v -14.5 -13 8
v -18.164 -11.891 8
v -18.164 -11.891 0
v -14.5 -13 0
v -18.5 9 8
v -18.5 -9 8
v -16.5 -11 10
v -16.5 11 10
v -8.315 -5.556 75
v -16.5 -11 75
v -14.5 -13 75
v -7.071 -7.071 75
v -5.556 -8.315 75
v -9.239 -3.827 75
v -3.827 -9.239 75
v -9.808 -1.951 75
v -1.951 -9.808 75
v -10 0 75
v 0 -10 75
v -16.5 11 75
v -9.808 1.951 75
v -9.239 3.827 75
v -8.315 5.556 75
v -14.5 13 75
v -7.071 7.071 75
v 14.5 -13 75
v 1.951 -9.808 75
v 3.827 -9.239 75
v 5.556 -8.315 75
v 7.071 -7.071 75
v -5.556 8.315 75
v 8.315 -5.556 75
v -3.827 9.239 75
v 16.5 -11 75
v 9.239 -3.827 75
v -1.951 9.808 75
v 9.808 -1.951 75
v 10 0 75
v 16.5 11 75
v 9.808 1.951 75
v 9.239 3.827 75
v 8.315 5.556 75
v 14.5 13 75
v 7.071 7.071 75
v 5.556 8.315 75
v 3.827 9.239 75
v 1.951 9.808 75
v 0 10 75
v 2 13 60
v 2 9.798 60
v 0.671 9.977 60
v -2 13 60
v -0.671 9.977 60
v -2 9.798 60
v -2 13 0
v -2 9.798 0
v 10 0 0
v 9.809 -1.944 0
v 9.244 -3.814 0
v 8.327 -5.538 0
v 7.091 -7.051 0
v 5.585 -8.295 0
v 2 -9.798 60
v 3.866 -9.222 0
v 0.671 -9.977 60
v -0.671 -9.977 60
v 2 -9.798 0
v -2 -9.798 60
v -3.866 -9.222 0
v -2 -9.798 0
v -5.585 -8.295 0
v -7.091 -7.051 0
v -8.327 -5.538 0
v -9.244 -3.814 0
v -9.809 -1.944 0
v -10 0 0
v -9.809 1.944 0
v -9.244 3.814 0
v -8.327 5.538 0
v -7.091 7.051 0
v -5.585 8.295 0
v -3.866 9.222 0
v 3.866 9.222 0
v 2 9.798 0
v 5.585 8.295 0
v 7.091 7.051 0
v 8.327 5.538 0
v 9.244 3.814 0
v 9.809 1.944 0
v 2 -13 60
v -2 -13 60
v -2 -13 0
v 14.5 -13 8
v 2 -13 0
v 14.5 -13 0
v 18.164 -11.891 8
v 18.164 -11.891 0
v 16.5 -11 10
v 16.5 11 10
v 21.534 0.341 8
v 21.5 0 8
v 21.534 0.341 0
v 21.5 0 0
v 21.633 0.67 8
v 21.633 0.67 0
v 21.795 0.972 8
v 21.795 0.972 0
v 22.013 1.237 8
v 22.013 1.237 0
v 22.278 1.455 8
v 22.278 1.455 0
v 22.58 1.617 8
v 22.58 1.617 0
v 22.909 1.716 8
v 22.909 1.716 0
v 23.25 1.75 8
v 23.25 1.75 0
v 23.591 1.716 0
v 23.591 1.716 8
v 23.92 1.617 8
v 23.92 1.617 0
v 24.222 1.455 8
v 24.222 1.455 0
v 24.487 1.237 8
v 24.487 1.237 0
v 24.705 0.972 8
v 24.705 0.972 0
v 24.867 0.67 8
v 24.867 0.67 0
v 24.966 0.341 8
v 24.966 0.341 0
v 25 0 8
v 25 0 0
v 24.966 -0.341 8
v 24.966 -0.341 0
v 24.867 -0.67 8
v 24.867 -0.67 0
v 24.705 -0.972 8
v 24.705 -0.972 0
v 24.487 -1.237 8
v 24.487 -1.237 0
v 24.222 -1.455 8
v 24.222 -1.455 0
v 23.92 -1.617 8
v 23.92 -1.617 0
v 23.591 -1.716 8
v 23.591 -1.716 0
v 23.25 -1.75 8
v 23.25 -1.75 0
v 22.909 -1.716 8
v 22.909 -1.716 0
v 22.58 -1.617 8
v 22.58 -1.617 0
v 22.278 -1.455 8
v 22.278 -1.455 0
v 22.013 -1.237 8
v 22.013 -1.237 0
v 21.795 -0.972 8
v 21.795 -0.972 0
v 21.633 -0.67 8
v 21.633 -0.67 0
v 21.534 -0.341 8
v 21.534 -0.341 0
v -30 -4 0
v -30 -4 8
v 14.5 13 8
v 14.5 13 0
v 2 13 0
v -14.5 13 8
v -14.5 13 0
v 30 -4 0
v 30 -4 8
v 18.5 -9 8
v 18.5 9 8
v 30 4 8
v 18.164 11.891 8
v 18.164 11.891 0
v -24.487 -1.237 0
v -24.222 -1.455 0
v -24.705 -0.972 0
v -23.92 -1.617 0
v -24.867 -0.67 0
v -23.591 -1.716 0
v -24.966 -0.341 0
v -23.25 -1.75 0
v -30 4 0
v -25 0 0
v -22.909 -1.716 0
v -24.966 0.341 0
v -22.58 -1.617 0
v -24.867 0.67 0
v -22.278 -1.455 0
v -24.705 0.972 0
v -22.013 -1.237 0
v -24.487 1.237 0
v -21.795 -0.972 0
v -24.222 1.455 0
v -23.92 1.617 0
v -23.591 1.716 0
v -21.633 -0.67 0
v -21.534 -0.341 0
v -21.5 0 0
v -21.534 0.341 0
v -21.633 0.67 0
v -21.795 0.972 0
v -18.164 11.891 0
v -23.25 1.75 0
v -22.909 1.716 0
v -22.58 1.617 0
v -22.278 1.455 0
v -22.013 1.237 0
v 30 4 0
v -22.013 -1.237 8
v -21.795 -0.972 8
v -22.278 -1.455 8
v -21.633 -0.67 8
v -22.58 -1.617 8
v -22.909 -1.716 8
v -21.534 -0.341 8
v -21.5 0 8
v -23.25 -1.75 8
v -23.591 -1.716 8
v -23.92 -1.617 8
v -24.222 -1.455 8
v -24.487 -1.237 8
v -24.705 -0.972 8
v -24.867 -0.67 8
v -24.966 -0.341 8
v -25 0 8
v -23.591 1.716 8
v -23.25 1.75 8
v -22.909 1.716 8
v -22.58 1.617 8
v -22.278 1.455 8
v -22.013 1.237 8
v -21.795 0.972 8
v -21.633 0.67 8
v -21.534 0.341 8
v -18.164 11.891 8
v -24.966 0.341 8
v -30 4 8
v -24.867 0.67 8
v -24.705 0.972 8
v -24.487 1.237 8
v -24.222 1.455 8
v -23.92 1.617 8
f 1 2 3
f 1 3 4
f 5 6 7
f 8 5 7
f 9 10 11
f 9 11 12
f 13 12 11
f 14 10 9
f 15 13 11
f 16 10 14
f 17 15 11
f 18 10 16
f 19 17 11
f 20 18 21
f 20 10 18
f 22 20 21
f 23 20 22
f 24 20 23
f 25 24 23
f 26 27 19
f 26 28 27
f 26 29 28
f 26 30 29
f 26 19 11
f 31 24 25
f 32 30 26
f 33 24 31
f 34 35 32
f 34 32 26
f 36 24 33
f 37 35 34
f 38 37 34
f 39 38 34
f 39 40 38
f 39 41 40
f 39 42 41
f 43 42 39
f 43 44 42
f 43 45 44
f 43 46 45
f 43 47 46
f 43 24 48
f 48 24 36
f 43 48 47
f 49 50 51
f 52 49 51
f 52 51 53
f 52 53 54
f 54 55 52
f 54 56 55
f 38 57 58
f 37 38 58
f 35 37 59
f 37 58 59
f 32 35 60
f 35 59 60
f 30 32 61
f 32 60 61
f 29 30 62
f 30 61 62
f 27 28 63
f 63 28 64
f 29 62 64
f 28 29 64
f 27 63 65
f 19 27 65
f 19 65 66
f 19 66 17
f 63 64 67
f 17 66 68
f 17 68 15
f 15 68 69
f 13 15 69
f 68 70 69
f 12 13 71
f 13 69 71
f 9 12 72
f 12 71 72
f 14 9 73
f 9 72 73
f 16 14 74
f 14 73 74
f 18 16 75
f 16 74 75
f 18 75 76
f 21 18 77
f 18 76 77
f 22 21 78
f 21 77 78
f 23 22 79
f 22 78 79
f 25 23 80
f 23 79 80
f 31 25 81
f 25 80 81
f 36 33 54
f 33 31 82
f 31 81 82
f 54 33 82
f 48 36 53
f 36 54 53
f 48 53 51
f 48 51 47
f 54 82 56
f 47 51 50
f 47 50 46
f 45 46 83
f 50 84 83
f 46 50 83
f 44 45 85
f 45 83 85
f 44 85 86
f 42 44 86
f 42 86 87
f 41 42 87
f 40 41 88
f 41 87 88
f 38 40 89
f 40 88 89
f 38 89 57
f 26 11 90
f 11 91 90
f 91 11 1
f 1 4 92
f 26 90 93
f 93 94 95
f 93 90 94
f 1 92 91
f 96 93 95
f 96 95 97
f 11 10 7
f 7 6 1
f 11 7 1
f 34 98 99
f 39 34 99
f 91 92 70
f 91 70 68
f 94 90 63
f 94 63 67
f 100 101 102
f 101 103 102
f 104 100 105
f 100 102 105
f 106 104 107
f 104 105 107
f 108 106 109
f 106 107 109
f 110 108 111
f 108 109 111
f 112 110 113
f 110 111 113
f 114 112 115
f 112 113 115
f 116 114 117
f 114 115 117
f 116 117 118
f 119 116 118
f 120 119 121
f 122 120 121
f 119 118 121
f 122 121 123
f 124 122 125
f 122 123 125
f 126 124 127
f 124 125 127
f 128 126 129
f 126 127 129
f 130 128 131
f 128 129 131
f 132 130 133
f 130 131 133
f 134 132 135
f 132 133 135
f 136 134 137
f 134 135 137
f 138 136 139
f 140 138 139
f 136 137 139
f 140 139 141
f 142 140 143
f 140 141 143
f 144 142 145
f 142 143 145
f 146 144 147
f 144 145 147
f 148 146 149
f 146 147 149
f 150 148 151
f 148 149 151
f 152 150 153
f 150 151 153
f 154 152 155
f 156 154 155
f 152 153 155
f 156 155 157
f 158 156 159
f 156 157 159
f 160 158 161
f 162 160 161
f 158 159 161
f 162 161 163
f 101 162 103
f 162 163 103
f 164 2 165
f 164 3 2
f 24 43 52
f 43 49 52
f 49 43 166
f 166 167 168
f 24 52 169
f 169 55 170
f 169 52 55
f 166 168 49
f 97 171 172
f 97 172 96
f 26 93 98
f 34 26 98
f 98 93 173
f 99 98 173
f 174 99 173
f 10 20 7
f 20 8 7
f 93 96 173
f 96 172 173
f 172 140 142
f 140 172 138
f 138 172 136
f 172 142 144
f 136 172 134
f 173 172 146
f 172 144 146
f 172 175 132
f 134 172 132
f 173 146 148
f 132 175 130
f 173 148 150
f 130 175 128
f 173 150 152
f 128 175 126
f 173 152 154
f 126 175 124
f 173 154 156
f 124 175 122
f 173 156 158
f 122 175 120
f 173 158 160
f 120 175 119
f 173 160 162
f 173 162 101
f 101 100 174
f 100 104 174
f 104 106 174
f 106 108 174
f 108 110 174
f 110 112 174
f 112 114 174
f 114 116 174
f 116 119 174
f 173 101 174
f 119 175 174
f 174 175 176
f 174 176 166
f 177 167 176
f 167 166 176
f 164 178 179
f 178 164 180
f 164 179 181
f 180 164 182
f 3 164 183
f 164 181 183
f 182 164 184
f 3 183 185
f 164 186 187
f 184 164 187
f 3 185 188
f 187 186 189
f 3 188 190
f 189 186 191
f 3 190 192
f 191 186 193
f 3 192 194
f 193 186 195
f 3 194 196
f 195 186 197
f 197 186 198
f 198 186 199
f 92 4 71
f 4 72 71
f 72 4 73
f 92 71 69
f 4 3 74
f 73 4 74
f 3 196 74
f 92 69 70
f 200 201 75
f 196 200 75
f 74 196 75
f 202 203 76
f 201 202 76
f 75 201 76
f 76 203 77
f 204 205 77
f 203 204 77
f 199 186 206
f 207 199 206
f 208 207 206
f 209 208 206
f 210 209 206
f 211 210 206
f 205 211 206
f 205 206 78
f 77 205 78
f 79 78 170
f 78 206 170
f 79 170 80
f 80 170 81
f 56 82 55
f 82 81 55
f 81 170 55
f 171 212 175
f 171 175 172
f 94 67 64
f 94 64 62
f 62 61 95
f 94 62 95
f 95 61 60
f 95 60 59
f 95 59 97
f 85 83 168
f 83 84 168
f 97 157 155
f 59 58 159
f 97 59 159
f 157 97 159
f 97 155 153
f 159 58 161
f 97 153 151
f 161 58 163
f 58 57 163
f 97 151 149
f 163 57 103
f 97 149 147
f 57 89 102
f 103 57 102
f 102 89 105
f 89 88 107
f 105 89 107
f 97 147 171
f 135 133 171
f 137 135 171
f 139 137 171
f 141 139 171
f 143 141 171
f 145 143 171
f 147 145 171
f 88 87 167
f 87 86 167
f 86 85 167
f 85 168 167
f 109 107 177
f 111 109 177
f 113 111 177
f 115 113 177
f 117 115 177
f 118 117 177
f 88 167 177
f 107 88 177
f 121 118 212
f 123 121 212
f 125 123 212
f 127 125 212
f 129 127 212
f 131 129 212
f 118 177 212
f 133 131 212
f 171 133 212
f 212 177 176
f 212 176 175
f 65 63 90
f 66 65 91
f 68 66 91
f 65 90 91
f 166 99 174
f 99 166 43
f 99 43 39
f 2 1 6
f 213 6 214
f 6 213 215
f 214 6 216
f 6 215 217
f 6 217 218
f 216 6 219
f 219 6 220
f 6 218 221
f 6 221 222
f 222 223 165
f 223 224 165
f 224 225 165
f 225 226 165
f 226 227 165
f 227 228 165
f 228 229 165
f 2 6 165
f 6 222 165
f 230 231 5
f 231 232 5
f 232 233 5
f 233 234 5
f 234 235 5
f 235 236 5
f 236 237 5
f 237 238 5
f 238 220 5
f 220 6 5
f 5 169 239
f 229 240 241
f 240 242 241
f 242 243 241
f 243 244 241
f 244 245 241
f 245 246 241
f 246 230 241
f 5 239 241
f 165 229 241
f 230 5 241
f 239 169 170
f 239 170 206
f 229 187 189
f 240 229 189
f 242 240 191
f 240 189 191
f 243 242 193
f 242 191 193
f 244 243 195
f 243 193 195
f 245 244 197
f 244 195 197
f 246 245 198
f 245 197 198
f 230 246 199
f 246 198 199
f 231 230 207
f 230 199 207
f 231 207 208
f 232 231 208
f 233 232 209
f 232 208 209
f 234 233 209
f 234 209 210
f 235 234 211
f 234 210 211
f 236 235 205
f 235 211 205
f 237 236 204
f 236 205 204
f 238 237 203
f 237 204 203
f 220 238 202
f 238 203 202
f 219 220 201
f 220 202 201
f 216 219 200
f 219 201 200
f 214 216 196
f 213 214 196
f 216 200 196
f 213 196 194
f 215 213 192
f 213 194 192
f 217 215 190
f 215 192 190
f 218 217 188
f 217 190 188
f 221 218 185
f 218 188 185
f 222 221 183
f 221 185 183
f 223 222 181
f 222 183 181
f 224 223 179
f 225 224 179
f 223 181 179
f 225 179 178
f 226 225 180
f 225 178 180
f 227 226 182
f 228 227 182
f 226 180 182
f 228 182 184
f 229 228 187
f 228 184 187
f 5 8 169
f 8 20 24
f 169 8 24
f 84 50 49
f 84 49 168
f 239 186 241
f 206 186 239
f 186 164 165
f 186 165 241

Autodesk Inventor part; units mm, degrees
ref_plane "YZ Plane" through (0, 0, 0) normal (1, 0, 0) x (0, 1, 0)
ref_plane "XZ Plane" through (0, 0, 0) normal (0, 1, 0) x (-1, 0, 0)
ref_plane "XY Plane" through (0, 0, 0) normal (0, 0, 1) x (1, 0, 0)
sketch "スケッチ1" plane through (0, 0, 0) normal (0, 0, 1) x (1, 0, 0)
  line L0 (-16.5, 13) -> (16.5, 13)
  line L1 (16.5, 13) -> (16.5, -13)
  line L2 (16.5, -13) -> (-16.5, -13)
  line L3 (-16.5, -13) -> (-16.5, 13)
  line L4 (-16.5, 13) -> (16.5, -13) construction
  line L5 (16.5, 13) -> (-16.5, -13) construction
  circle A0 centre (0, 0) radius 10
  dimension "d0" = 33
  dimension "d1" = 26
  dimension "d2" = 20
extrude "押し出し1" add sketch "スケッチ1" along normal blind 70
sketch "スケッチ2" plane through (-16.5, -13, 0) normal (0, -1, 0) x (1, 0, 0)
  line L0 (18.5, 60) -> (18.5, 0)
  line L1 (18.5, 0) -> (14.5, 0)
  line L2 (14.5, 0) -> (14.5, 60)
  line L3 (18.5, 70) -> (14.5, 0) construction
  line L4 (18.5, 0) -> (14.5, 70) construction
  line L5 (0, 0) -> (33, 0) projected
  line L6 (18.5, 60) -> (14.5, 60)
  point P0 (16.5, 0)
  point P1 (16.5, 35)
  dimension "d5" = 4
extrude "押し出し2" cut sketch "スケッチ2" against normal blind 50
sketch "スケッチ3" plane through (0, 0, 70) normal (0, 0, 1) x (1, 0, 0)
  line L0 (-16.5, -13) -> (16.5, -13) projected
  line L1 (16.5, -13) -> (16.5, 13) projected
  line L2 (16.5, 13) -> (-16.5, 13) projected
  circle A0 centre (0, 0) radius 10 projected
  circle A1 centre (0, 0) radius 10 projected
  line L3 (16.5, 13) -> (-16.5, 13) projected
  line L4 (-16.5, 13) -> (-16.5, -13) projected
  line L5 (-16.5, -13) -> (16.5, -13) projected
  line L6 (16.5, -13) -> (-16.5, -13)
  line L7 (-16.5, -13) -> (-16.5, 13)
  line L8 (-16.5, 13) -> (16.5, 13)
  line L9 (16.5, 13) -> (16.5, -13)
  circle A2 centre (0, 0) radius 10
  line L10 (16.5, -13) -> (16.5, 13) projected
  line L11 (-16.5, 13) -> (-16.5, -13) projected
  dimension "d8" = 20
extrude "押し出し3" add sketch "スケッチ3" along normal blind 5
sketch "スケッチ4" plane through (0, 0, 0) normal (0, 0, -1) x (-1, 0, 0)
  line L0 (30, -4) -> (30, 4)
  line L1 (-30, 4) -> (-30, -4)
  line L2 (-30, -4) -> (30, 4) construction
  line L3 (30, -4) -> (-30, 4) construction
  line L4 (-2, 13) -> (-16.5, 13) projected
  line L5 (-16.5, 13) -> (-30, 4)
  line L6 (-16.5, 13) -> (-16.5, -13) projected
  line L7 (-30, -4) -> (-16.5, -13)
  line L8 (2, -9.798) -> (2, -13) projected
  line L9 (2, -13) -> (16.5, -13) projected
  line L10 (16.5, -13) -> (16.5, 13) projected
  line L11 (16.5, 13) -> (2, 13) projected
  line L12 (2, 13) -> (2, 9.798) projected
  arc A0 (2, -9.798) -> (2, 9.798) centre (0, 0) ccw projected
  line L13 (-2, -13) -> (-2, -9.798) projected
  arc A1 (-2, 9.798) -> (-2, -9.798) centre (0, 0) ccw projected
  line L14 (-2, 9.798) -> (-2, 13) projected
  line L15 (-2, 13) -> (-16.5, 13) projected
  line L16 (-16.5, 13) -> (-16.5, -13) projected
  line L17 (-16.5, -13) -> (-2, -13) projected
  line L18 (16.5, -13) -> (30, -4)
  line L19 (30, 4) -> (16.5, 13)
  circle A2 centre (-23.25, 0) radius 1.75
  circle A3 centre (23.25, 0) radius 1.75
  dimension "d15" = 3.5
  dimension "d16" = 3.5
extrude "押し出し4" add sketch "スケッチ4" against normal blind 8 contours L18 L10 L19 L0 | L5 L6 L7 L1
chamfer "面取り1" distance 2 angle 45 10 edges at (16.5, 0, 8) (-16.5, 0, 8) (16.5, -13, 41.5) (16.5, 13, 41.5) (-16.5, -13, 41.5) (-16.5, -13, 4) (16.5, -13, 4) (-16.5, 13, 41.5) (-16.5, 13, 4) (16.5, 13, 4)
properties part number "RescueKit-Pipev2"
